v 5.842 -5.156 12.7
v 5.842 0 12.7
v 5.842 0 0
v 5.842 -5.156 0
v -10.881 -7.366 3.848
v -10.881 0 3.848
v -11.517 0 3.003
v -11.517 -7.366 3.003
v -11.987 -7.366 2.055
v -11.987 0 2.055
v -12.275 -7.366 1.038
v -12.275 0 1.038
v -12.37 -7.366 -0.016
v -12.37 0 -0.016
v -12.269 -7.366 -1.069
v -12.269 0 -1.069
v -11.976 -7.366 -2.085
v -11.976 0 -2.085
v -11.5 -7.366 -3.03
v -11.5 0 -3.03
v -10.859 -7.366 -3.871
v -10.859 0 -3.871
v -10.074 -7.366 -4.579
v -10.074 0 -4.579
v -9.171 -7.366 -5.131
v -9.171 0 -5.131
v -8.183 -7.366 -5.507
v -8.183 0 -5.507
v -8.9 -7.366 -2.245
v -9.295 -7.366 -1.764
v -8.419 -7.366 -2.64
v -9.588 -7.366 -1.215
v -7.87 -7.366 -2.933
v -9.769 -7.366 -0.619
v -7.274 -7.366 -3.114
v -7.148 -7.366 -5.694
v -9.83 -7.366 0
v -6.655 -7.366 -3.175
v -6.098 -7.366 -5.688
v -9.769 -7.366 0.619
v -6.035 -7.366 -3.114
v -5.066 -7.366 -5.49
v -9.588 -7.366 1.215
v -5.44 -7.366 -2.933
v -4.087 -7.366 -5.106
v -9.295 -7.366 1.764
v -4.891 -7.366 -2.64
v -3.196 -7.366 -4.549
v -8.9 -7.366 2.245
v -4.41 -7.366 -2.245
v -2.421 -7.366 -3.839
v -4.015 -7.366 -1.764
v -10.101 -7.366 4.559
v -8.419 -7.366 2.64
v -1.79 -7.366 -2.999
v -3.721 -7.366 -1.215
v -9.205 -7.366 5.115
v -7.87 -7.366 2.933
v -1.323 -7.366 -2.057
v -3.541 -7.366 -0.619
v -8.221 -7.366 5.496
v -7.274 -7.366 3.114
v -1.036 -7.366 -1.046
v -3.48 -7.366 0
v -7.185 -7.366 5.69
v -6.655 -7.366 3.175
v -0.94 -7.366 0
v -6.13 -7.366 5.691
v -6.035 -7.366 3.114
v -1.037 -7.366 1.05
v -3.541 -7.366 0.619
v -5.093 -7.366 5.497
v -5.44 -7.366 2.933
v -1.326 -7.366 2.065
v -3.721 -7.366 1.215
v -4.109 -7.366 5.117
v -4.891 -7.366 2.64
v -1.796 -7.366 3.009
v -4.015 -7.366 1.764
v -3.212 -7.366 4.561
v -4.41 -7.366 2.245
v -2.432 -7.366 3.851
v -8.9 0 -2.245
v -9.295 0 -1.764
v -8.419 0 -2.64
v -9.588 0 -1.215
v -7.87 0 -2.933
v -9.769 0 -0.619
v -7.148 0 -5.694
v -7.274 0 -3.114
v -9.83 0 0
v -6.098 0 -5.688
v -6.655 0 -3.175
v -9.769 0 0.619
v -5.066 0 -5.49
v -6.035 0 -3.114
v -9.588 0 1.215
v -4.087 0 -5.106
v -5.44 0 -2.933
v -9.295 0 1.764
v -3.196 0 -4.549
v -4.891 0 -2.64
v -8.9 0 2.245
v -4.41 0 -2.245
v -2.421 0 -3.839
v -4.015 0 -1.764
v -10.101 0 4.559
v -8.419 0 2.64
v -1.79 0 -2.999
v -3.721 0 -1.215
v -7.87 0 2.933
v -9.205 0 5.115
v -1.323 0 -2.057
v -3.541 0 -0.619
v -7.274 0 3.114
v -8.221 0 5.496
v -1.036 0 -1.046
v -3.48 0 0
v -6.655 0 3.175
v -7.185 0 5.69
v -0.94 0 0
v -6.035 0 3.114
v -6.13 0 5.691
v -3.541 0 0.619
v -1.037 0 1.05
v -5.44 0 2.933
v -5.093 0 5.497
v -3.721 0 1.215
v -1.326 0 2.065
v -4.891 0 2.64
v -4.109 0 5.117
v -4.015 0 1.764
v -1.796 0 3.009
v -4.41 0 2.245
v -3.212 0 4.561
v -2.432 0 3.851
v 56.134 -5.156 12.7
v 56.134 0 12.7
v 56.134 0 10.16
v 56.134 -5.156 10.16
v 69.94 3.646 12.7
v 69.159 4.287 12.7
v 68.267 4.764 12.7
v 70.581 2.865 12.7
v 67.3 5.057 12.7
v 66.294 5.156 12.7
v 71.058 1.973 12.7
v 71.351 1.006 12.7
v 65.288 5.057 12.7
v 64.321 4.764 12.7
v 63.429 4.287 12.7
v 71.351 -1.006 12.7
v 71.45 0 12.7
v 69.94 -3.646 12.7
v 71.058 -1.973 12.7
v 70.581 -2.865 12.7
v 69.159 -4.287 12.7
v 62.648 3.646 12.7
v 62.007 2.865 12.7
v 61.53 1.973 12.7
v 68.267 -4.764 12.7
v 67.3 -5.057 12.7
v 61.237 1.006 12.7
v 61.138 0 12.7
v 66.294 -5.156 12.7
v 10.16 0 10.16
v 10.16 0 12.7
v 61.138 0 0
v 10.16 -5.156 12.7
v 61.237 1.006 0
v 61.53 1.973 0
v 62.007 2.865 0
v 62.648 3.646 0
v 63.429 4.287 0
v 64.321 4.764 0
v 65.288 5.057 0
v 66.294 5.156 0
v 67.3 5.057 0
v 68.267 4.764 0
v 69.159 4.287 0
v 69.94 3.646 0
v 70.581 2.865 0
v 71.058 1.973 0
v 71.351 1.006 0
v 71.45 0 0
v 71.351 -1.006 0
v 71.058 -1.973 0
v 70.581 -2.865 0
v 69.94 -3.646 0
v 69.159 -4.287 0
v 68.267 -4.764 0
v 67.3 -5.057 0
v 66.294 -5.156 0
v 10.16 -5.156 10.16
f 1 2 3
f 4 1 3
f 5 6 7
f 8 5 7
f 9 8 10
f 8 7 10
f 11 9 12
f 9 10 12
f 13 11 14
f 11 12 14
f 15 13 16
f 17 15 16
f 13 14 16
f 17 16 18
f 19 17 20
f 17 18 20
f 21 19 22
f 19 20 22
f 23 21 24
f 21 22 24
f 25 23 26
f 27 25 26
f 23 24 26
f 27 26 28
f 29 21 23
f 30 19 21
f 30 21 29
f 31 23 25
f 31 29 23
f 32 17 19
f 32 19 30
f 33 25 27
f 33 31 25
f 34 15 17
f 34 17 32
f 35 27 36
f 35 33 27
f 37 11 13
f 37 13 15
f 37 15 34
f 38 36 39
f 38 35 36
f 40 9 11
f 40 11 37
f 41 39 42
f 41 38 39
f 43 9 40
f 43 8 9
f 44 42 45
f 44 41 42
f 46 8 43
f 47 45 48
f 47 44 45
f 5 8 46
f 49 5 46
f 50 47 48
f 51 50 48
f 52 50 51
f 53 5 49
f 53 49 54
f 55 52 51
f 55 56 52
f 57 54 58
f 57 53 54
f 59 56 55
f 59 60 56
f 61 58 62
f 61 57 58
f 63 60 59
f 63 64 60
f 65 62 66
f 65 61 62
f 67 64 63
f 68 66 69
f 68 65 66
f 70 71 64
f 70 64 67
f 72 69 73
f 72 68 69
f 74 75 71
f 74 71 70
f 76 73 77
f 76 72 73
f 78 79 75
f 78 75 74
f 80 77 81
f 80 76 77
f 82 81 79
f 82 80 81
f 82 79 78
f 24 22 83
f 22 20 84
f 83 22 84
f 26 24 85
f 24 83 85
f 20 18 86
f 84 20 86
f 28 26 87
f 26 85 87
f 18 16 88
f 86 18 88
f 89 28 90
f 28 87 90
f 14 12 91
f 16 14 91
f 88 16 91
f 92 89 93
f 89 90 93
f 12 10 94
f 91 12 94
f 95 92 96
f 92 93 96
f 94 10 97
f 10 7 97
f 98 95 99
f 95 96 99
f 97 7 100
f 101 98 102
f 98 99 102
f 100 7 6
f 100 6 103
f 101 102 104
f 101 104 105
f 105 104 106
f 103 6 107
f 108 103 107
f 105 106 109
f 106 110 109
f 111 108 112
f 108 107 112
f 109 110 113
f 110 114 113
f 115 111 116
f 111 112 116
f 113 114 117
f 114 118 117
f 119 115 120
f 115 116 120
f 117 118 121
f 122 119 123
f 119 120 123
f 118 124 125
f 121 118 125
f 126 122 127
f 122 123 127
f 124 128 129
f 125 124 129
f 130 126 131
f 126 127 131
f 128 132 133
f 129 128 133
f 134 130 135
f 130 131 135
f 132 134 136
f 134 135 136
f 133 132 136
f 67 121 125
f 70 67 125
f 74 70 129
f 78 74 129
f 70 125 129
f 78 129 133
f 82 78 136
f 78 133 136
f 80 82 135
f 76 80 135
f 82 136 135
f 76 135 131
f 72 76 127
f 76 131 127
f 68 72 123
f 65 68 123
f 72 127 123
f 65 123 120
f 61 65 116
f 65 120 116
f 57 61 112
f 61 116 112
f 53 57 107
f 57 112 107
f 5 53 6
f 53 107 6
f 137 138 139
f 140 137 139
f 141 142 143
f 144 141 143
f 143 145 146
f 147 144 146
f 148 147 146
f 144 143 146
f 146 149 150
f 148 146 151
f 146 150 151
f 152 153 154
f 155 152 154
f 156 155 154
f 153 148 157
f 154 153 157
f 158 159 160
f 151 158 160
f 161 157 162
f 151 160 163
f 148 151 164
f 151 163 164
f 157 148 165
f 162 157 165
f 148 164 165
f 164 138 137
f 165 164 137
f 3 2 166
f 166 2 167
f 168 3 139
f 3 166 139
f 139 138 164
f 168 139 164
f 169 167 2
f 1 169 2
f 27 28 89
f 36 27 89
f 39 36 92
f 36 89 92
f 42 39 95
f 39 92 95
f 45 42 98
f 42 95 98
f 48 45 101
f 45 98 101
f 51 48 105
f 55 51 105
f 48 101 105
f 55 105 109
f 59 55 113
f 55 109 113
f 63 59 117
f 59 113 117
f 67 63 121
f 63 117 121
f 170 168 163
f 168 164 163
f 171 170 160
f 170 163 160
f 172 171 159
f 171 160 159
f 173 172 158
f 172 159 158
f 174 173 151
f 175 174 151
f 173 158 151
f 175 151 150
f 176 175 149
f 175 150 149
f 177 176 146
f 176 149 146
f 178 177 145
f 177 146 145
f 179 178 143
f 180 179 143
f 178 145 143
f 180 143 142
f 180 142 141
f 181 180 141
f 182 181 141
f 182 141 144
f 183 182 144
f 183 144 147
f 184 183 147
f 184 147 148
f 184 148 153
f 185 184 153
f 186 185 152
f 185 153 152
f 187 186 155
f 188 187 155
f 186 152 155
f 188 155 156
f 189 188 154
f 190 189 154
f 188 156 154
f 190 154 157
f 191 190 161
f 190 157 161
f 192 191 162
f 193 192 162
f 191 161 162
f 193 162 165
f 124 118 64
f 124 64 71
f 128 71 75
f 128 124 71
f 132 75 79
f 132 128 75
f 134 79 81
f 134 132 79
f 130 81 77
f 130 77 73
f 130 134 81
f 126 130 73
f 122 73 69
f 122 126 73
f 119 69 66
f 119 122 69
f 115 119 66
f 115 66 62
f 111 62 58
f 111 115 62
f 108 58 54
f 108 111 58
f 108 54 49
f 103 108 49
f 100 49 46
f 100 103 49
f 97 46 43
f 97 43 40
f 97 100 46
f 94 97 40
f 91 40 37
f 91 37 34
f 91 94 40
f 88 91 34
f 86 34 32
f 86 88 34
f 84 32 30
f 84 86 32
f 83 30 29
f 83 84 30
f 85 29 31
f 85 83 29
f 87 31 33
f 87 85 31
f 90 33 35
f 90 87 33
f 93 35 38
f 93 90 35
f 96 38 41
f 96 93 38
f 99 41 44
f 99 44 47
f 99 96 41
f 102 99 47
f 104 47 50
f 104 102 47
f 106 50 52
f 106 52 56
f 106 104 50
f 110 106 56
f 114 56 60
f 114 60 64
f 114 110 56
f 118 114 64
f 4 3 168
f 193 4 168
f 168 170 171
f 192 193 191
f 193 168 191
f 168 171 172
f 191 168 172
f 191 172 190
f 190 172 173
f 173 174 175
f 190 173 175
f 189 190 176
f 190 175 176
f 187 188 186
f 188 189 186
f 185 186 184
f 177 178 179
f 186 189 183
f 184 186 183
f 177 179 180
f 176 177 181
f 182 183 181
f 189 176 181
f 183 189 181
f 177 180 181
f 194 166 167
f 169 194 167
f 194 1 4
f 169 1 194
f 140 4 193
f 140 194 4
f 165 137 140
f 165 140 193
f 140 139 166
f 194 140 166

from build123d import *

# Parameters (mm, degrees)
F1_DEPTH  = 5.1562
F0_R      = 3.175
F2_DEPTH  = 7.366
F1_FACE_W = 5.1562
F1_FACE_H = 12.7


with BuildPart() as f1:
    # F0 (on Front) → F1 (new body)
    with BuildSketch(Plane.XZ):
        Polygon((5.842, 12.7), (5.842, 0), (66.294, 0), (66.294, 12.7), (56.134, 12.7), (56.134, 10.16), (10.16, 10.16), (10.16, 12.7), align=None)
    extrude(amount=F1_DEPTH)

    # F1_face (on face) → F3 (revolve)
    with BuildSketch(Plane(origin=(66.294, -2.5781, 6.35), x_dir=(0, 1, 0), z_dir=(1, 0, 0))):
        Rectangle(F1_FACE_W, F1_FACE_H)
    revolve(axis=Axis((66.294, 0, 6.35), (0, 0, -1)))


with BuildPart() as f2:
    # F0 (on Front) → F2 (new body)
    with BuildSketch(Plane.XZ):
        with BuildLine():
            ThreePointArc((-8.182663, -5.506983), (-3.195791, -4.549339), (-0.9398, 0))
            ThreePointArc((-0.9398, 0), (-4.591961, 5.329721), (-10.88063, 3.847543))
            ThreePointArc((-10.88063, 3.847543), (-12.145978, -1.583727), (-8.182663, -5.506983))
        make_face()
        with Locations((-6.6548, 0)):
            Circle(F0_R, mode=Mode.SUBTRACT)
    extrude(amount=F2_DEPTH)


solid = Compound([f1.part, f2.part])
